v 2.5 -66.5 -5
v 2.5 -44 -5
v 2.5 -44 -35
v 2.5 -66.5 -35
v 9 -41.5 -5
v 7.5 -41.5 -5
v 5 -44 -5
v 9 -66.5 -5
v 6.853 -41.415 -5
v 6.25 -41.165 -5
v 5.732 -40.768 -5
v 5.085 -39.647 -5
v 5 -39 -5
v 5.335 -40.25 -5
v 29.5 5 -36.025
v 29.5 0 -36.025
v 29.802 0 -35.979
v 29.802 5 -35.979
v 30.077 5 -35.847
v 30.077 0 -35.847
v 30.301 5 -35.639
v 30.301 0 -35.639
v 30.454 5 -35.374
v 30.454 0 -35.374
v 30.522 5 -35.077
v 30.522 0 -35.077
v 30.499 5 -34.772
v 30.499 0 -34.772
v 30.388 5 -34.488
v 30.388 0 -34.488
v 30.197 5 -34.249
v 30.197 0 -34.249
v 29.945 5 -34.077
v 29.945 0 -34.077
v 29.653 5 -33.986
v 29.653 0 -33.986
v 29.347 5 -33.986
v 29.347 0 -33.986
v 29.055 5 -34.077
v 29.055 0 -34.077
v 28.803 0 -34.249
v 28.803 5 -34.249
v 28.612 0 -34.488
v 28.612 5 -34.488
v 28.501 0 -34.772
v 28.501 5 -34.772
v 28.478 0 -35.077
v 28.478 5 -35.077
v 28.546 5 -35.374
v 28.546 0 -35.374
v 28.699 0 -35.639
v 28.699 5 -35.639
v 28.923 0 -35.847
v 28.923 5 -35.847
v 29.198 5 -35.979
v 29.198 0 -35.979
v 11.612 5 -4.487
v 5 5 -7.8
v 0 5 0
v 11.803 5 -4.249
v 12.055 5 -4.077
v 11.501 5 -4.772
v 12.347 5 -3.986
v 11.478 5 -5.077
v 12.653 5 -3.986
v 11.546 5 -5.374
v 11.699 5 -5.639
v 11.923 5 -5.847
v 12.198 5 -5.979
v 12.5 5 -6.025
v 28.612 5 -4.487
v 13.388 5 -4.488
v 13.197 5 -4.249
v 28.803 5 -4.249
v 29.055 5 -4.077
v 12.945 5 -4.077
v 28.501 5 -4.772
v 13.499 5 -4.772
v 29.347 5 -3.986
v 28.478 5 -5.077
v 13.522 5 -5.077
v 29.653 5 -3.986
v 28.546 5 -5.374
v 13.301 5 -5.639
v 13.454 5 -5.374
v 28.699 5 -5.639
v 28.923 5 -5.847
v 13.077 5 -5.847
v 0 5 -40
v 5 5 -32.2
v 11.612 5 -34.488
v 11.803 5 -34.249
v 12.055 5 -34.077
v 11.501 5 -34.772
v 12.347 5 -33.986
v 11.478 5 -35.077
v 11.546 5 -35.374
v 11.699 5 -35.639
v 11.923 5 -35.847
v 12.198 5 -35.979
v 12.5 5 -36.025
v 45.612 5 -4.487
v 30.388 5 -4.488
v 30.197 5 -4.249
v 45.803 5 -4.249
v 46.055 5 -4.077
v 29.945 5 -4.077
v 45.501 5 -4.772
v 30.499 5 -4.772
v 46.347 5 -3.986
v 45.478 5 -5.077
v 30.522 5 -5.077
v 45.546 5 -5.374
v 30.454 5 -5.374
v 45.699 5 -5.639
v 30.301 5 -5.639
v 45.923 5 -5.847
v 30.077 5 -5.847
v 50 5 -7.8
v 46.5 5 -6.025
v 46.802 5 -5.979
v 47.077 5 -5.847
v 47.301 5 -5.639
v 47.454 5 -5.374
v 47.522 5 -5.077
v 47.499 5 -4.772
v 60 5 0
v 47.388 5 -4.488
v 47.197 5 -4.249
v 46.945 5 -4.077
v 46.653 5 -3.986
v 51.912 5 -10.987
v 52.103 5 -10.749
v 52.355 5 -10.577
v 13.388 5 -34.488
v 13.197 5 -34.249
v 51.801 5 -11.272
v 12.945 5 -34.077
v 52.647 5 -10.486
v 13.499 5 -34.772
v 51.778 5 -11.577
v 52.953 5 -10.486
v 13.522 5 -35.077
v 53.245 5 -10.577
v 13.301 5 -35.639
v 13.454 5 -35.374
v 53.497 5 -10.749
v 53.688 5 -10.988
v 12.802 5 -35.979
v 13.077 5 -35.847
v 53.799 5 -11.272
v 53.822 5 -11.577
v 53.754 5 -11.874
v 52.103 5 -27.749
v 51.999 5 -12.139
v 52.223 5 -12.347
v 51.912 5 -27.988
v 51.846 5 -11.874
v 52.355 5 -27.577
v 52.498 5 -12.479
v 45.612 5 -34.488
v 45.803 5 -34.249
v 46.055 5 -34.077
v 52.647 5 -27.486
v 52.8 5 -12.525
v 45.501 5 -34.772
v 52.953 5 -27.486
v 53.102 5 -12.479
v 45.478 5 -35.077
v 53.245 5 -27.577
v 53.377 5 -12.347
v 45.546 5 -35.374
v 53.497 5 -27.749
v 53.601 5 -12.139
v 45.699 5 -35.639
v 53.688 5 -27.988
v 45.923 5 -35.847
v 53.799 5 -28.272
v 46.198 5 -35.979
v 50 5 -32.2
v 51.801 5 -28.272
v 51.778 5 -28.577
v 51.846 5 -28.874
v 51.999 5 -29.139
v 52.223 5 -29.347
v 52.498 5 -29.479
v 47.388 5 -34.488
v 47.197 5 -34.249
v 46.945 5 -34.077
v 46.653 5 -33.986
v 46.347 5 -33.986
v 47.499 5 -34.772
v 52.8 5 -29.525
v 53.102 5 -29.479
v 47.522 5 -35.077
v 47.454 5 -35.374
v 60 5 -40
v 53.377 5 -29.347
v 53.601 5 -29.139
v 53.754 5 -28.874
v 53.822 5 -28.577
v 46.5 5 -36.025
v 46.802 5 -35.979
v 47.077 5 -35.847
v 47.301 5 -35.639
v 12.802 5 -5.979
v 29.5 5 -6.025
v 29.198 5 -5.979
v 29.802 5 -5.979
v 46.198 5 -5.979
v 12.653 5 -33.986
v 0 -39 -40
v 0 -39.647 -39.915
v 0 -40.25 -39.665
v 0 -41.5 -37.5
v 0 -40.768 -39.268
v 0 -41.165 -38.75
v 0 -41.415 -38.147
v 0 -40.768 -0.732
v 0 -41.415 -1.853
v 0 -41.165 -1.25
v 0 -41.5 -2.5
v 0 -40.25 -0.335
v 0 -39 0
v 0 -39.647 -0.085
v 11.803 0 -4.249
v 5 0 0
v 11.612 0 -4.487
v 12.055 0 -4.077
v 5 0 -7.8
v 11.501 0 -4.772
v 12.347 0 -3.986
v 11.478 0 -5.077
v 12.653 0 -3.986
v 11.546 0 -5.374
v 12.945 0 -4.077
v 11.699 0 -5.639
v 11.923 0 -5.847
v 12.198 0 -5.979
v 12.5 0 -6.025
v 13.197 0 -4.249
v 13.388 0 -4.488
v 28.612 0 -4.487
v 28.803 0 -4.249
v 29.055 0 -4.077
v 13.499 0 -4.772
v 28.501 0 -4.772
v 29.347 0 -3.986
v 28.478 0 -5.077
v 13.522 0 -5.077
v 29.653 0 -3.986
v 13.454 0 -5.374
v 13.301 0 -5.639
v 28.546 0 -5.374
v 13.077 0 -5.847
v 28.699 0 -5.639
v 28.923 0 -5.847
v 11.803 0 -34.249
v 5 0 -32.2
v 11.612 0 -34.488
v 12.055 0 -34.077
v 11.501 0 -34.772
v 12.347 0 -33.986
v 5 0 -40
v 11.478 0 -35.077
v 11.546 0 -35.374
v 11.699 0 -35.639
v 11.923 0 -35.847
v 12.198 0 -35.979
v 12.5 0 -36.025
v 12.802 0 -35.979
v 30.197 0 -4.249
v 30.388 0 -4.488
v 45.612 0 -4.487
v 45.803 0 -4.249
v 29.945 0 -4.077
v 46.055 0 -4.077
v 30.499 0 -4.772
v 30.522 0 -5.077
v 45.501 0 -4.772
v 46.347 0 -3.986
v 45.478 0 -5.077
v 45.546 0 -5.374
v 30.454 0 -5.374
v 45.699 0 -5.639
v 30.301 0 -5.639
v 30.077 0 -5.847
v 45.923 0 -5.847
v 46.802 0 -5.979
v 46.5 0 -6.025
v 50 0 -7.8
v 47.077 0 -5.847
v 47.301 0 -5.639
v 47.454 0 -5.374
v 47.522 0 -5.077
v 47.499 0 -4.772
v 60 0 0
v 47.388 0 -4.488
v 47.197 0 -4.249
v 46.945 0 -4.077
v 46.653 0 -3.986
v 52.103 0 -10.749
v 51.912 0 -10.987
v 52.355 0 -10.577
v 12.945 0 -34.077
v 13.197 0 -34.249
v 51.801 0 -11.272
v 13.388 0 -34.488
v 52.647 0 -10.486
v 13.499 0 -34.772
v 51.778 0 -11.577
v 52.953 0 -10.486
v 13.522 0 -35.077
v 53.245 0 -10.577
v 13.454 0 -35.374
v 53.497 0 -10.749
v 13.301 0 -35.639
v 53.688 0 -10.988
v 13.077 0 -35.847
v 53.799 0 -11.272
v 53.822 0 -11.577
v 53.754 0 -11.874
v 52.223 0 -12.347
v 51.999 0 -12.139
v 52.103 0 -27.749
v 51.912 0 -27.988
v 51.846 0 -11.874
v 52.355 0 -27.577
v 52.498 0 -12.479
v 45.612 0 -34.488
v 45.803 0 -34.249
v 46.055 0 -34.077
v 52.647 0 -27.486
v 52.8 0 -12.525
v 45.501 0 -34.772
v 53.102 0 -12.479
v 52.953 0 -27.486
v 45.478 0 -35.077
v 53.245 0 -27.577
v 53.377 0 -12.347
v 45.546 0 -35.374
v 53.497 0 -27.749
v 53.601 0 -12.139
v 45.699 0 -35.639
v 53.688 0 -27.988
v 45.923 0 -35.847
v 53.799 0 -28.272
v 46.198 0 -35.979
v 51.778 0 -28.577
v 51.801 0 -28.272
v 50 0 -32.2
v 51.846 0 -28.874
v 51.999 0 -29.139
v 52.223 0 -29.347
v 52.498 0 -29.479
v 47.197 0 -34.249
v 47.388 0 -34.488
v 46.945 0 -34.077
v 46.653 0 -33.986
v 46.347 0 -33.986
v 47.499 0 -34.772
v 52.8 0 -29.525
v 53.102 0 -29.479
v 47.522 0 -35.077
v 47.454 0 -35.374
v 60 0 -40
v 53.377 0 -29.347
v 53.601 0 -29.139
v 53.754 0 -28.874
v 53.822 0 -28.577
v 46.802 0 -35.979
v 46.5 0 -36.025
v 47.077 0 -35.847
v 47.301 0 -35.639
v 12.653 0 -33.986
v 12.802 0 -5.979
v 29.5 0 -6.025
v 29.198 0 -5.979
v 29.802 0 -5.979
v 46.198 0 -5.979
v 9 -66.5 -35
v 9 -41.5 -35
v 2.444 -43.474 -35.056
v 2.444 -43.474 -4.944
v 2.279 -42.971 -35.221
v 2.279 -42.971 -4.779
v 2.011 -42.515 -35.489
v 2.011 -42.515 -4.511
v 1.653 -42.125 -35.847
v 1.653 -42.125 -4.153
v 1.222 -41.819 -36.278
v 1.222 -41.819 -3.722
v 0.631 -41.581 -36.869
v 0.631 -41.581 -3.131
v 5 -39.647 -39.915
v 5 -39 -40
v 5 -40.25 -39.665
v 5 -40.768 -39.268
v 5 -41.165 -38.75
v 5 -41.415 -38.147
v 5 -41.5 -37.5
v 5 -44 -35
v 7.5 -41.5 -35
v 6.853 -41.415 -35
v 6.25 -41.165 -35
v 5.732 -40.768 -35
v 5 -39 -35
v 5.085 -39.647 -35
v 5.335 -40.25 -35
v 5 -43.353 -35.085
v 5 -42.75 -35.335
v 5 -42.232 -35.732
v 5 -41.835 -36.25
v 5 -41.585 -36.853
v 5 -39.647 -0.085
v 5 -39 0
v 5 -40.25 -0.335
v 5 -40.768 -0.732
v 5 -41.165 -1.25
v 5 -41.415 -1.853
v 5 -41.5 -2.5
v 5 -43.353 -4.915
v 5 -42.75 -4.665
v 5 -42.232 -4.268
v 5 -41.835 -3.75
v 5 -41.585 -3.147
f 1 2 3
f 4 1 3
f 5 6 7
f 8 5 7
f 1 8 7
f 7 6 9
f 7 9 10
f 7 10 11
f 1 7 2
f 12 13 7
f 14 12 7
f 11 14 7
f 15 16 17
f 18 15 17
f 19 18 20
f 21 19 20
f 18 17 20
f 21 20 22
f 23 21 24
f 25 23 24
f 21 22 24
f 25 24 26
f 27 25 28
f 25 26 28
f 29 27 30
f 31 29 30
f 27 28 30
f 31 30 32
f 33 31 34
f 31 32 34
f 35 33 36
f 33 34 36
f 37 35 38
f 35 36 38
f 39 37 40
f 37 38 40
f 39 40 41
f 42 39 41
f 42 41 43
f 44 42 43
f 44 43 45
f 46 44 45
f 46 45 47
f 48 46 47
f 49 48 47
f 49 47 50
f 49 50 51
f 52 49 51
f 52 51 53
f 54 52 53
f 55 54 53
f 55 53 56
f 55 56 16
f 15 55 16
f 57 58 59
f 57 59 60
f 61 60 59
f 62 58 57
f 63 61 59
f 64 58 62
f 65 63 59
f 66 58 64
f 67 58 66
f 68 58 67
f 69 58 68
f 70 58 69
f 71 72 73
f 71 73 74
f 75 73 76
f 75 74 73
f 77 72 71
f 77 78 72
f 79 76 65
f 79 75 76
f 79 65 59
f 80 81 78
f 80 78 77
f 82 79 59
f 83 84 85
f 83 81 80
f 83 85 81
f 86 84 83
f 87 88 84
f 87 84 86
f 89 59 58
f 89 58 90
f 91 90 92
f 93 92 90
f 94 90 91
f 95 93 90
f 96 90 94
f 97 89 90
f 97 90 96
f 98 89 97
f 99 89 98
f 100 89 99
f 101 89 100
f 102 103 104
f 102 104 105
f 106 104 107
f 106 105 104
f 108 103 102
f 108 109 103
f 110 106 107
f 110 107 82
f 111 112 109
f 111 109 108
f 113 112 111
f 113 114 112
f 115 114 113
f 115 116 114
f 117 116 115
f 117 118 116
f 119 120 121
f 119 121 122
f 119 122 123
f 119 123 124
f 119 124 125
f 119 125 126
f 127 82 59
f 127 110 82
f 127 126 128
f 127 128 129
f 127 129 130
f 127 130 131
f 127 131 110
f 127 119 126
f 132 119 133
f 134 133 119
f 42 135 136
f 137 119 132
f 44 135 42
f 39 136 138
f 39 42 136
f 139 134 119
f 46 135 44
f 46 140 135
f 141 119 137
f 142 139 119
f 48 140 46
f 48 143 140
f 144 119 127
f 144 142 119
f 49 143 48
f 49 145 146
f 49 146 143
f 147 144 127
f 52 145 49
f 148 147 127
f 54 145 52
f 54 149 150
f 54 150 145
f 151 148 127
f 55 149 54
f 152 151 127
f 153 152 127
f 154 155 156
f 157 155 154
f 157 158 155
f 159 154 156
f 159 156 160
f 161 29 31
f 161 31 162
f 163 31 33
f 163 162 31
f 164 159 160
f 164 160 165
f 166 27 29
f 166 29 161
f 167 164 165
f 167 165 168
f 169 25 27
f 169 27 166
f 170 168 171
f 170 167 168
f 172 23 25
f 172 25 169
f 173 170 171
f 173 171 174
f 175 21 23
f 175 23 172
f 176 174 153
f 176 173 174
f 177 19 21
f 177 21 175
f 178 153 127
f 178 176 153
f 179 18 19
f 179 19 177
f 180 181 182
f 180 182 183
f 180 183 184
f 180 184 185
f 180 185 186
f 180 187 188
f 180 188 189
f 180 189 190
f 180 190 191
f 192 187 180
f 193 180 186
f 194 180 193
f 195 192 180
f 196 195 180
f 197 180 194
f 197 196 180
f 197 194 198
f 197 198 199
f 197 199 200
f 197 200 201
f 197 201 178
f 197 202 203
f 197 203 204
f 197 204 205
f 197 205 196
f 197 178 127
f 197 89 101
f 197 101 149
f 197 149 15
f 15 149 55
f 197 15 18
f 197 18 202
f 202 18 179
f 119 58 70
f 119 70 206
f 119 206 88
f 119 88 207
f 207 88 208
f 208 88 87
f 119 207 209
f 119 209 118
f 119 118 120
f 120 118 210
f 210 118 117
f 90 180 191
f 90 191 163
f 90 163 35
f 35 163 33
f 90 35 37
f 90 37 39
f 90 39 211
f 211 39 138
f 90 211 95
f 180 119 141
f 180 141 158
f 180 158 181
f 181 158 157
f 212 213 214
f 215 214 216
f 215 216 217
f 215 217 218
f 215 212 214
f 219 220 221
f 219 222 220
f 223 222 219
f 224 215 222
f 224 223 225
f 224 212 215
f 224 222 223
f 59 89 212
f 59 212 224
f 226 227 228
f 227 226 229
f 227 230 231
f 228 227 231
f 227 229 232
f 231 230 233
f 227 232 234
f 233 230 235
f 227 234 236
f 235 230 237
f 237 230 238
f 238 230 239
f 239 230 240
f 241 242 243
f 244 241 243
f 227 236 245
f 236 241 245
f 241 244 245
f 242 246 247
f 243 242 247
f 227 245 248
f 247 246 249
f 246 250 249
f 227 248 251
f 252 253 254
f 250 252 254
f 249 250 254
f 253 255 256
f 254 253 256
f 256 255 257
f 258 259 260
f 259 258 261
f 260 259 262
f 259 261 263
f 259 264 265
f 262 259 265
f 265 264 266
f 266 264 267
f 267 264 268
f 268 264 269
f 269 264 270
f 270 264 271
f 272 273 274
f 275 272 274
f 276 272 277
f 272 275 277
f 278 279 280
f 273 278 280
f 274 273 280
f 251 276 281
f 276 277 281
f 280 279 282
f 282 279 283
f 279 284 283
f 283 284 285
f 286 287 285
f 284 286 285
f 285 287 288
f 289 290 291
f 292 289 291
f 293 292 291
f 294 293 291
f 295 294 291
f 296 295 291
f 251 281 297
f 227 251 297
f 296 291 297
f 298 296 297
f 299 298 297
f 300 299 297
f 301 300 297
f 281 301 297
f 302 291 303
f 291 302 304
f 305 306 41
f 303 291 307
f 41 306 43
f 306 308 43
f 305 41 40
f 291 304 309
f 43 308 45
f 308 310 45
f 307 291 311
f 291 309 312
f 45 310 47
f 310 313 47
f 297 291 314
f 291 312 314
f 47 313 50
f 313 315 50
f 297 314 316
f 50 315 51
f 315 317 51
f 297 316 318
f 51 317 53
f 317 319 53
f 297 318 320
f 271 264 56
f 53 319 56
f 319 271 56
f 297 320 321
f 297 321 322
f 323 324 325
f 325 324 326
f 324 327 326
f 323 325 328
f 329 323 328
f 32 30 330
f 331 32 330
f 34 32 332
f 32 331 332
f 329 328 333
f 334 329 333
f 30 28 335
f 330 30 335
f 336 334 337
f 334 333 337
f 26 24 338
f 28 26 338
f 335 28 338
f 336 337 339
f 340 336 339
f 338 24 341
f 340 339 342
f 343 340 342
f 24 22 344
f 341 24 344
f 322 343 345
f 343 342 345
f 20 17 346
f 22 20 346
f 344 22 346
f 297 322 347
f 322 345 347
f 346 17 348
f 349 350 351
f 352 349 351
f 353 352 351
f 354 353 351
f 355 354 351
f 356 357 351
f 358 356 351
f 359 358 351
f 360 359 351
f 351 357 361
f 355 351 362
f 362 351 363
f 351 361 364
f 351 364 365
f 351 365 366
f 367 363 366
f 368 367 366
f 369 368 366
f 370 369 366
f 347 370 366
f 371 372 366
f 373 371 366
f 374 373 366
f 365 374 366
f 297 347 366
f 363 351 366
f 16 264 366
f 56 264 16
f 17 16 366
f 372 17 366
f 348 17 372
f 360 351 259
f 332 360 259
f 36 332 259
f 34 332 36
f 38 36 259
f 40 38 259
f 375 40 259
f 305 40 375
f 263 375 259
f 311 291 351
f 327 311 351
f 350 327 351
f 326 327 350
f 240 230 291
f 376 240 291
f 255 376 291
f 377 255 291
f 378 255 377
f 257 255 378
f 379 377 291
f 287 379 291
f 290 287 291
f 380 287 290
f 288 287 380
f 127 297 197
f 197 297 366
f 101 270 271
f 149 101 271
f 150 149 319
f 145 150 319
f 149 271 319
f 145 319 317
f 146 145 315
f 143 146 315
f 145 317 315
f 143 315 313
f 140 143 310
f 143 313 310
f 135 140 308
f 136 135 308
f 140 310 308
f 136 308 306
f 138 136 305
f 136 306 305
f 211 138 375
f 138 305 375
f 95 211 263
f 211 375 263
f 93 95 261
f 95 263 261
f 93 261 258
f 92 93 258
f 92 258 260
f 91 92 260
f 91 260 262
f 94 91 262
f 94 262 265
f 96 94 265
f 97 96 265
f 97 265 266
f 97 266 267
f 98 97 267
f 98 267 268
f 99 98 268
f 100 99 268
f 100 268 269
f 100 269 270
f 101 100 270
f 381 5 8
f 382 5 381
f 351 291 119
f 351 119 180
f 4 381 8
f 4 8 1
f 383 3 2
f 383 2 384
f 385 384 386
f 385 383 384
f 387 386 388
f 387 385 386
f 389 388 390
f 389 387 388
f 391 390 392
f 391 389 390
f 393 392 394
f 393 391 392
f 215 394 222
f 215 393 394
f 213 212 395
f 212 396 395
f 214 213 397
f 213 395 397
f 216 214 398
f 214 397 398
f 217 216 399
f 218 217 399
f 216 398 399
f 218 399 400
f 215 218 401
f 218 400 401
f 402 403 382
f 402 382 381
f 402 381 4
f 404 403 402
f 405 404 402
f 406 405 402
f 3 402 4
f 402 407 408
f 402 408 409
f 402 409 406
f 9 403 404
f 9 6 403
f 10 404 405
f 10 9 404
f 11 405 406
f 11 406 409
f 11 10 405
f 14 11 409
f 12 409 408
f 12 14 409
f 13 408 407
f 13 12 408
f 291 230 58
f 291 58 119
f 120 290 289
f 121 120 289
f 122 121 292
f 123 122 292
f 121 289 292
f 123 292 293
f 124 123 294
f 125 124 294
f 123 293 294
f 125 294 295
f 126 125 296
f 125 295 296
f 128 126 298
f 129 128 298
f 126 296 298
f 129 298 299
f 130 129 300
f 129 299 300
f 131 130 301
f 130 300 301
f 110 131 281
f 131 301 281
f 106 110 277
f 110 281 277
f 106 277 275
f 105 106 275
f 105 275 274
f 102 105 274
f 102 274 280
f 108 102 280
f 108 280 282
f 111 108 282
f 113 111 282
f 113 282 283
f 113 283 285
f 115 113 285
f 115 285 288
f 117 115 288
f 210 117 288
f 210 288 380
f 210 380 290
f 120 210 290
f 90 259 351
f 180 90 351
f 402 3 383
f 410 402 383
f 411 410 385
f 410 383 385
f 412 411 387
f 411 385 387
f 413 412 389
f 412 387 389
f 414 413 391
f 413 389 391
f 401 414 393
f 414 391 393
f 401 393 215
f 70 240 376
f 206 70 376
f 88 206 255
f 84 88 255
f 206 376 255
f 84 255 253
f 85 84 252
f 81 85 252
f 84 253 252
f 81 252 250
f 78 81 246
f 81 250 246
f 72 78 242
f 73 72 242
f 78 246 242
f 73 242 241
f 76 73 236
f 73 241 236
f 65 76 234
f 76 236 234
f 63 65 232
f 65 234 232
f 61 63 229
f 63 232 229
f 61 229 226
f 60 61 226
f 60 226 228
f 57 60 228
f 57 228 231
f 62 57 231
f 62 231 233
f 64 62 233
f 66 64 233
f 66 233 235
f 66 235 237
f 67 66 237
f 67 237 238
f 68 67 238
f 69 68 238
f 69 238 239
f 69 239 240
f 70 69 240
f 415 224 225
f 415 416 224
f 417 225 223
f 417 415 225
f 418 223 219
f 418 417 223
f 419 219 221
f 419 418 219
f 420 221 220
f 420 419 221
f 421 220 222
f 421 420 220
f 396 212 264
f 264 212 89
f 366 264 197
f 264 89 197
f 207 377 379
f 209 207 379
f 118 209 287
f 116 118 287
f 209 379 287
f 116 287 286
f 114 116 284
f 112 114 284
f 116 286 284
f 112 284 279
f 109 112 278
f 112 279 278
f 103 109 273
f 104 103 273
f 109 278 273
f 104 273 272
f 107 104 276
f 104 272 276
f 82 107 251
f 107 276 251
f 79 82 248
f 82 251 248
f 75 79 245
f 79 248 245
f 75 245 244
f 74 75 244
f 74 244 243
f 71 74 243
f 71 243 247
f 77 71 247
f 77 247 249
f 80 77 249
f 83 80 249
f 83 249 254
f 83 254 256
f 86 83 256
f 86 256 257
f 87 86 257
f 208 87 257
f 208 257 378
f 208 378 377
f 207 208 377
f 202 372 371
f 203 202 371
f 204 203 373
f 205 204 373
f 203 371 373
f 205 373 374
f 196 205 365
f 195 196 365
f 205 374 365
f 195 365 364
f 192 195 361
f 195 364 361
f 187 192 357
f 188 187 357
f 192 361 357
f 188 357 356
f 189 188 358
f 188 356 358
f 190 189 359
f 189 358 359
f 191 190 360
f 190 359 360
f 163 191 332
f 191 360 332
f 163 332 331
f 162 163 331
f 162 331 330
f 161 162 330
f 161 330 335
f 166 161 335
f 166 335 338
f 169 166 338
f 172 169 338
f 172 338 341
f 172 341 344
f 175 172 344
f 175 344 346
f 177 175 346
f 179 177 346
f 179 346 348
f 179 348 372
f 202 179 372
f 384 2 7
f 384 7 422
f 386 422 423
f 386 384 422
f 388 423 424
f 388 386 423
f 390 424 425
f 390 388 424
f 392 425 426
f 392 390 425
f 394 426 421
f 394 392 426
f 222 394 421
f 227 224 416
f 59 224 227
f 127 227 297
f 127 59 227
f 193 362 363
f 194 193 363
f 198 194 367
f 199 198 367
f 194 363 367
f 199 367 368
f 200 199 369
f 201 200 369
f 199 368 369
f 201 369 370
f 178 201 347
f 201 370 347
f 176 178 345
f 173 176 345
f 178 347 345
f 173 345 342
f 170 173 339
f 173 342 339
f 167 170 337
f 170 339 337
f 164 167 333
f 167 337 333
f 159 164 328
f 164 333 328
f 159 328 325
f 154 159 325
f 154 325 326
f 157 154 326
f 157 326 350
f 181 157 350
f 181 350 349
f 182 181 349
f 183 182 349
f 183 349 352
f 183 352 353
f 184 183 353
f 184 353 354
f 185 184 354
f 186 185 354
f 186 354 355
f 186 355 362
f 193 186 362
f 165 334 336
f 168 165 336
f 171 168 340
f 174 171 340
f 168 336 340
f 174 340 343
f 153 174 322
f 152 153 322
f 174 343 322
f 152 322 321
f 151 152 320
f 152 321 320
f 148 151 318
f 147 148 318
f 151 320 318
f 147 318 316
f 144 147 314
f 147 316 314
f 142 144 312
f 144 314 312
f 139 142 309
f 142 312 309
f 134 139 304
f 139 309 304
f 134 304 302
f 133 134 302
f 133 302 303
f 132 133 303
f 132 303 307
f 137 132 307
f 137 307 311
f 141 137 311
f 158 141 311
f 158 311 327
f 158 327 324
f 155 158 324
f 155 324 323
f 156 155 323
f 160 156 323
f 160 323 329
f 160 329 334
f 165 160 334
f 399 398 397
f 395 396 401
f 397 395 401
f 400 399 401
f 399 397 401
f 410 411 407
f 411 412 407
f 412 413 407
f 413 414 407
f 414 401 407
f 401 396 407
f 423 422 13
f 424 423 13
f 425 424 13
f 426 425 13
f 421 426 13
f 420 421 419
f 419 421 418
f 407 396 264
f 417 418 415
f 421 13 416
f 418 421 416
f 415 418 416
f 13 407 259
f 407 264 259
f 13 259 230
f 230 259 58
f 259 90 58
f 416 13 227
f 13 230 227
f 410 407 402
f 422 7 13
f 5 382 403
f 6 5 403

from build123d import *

# Parameters (mm, degrees)
SKETCH1_W           = 60
SKETCH1_H           = 40
SKETCH1_W_2         = 45
SKETCH1_H_2         = 24.4
BOSS_EXTRUDE1_DEPTH = 5
SKETCH6_W           = 5
SKETCH6_H           = 40
BOSS_EXTRUDE4_DEPTH = 41.5
SKETCH7_W           = 6.5
SKETCH7_H           = 30
BOSS_EXTRUDE5_DEPTH = 25
FILLET2_R           = 2.5
FILLET3_R           = 2.5
CUT_EXTRUDE1_REACH  = 100.093
SKETCH8_R           = 1.025


with BuildPart() as part:
    # Sketch1 → Boss-Extrude1 (new body)
    with BuildSketch(Plane(origin=(0, 0, 0), x_dir=(1, 0, 0), z_dir=(0, 1, 0))):
        with Locations((30, 20)):
            Rectangle(SKETCH1_W, SKETCH1_H)
        with Locations((27.5, 20)):
            Rectangle(SKETCH1_W_2, SKETCH1_H_2, mode=Mode.SUBTRACT)
    extrude(amount=BOSS_EXTRUDE1_DEPTH)

    # Sketch6 → Boss-Extrude4 (add)
    with BuildSketch(Plane.XZ):
        with Locations((2.5, -20)):
            Rectangle(SKETCH6_W, SKETCH6_H)
    extrude(amount=BOSS_EXTRUDE4_DEPTH)

    # Sketch7 → Boss-Extrude5 (add)
    with BuildSketch(Plane(origin=(0, -41.5, 0), x_dir=(-1, 0, 0), z_dir=(0, -1, 0))):
        with Locations((-5.75, 20)):
            Rectangle(SKETCH7_W, SKETCH7_H)
    extrude(amount=BOSS_EXTRUDE5_DEPTH)

    # Fillet2
    fillet2_edges = [part.edges().sort_by_distance(p)[0] for p in [
        (5, -41.5, -20),
        (2.5, -41.5, -20),
    ]]
    fillet(fillet2_edges, radius=FILLET2_R - 0.0001)  # a hair under: the kernel refuses the full size

    # Fillet3
    fillet3_edges = [part.edges().sort_by_distance(p)[0] for p in [
        (2.50005, -41.5, -5),
        (2.50005, -41.5, -35),
        (2.5, -41.5, 0),
        (2.5, -41.5, -40),
    ]]
    fillet(fillet3_edges, radius=FILLET3_R - 0.0001)  # a hair under: the kernel refuses the full size

    # Sketch8 → Cut-Extrude1 (cut, up to next)
    with BuildSketch(Plane(origin=(0, 0, 0), x_dir=(-1, 0, 0), z_dir=(0, -1, 0)), mode=Mode.PRIVATE) as cut_extrude1_sk1:
        with Locations(Location((-52.8, 28.5, 0), (0, 0, 90))):
            Circle(SKETCH8_R)
    cut_extrude1_tool1 = extrude(cut_extrude1_sk1.sketch, amount=-CUT_EXTRUDE1_REACH, mode=Mode.PRIVATE) & part.part
    # Sketch8 → Cut-Extrude1 (cut, up to next)
    with BuildSketch(Plane(origin=(0, 0, 0), x_dir=(-1, 0, 0), z_dir=(0, -1, 0)), mode=Mode.PRIVATE) as cut_extrude1_sk2:
        with Locations(Location((-46.5, 35, 0), (0, 0, 90))):
            Circle(SKETCH8_R)
    cut_extrude1_tool2 = extrude(cut_extrude1_sk2.sketch, amount=-CUT_EXTRUDE1_REACH, mode=Mode.PRIVATE) & part.part
    # Sketch8 → Cut-Extrude1 (cut, up to next)
    with BuildSketch(Plane(origin=(0, 0, 0), x_dir=(-1, 0, 0), z_dir=(0, -1, 0)), mode=Mode.PRIVATE) as cut_extrude1_sk3:
        with Locations(Location((-29.5, 35, 0), (0, 0, 90))):
            Circle(SKETCH8_R)
    cut_extrude1_tool3 = extrude(cut_extrude1_sk3.sketch, amount=-CUT_EXTRUDE1_REACH, mode=Mode.PRIVATE) & part.part
    # Sketch8 → Cut-Extrude1 (cut, up to next)
    with BuildSketch(Plane(origin=(0, 0, 0), x_dir=(-1, 0, 0), z_dir=(0, -1, 0)), mode=Mode.PRIVATE) as cut_extrude1_sk4:
        with Locations(Location((-12.5, 35, 0), (0, 0, 90))):
            Circle(SKETCH8_R)
    cut_extrude1_tool4 = extrude(cut_extrude1_sk4.sketch, amount=-CUT_EXTRUDE1_REACH, mode=Mode.PRIVATE) & part.part
    # Sketch8 → Cut-Extrude1 (cut, up to next)
    with BuildSketch(Plane(origin=(0, 0, 0), x_dir=(-1, 0, 0), z_dir=(0, -1, 0)), mode=Mode.PRIVATE) as cut_extrude1_sk5:
        with Locations(Location((-12.5, 5, 0), (0, 0, 90))):
            Circle(SKETCH8_R)
    cut_extrude1_tool5 = extrude(cut_extrude1_sk5.sketch, amount=-CUT_EXTRUDE1_REACH, mode=Mode.PRIVATE) & part.part
    # Sketch8 → Cut-Extrude1 (cut, up to next)
    with BuildSketch(Plane(origin=(0, 0, 0), x_dir=(-1, 0, 0), z_dir=(0, -1, 0)), mode=Mode.PRIVATE) as cut_extrude1_sk6:
        with Locations(Location((-29.5, 5, 0), (0, 0, 90))):
            Circle(SKETCH8_R)
    cut_extrude1_tool6 = extrude(cut_extrude1_sk6.sketch, amount=-CUT_EXTRUDE1_REACH, mode=Mode.PRIVATE) & part.part
    # Sketch8 → Cut-Extrude1 (cut, up to next)
    with BuildSketch(Plane(origin=(0, 0, 0), x_dir=(-1, 0, 0), z_dir=(0, -1, 0)), mode=Mode.PRIVATE) as cut_extrude1_sk7:
        with Locations(Location((-46.5, 5, 0), (0, 0, 90))):
            Circle(SKETCH8_R)
    cut_extrude1_tool7 = extrude(cut_extrude1_sk7.sketch, amount=-CUT_EXTRUDE1_REACH, mode=Mode.PRIVATE) & part.part
    # Sketch8 → Cut-Extrude1 (cut, up to next)
    with BuildSketch(Plane(origin=(0, 0, 0), x_dir=(-1, 0, 0), z_dir=(0, -1, 0)), mode=Mode.PRIVATE) as cut_extrude1_sk8:
        with Locations(Location((-52.8, 11.5, 0), (0, 0, 90))):
            Circle(SKETCH8_R)
    cut_extrude1_tool8 = extrude(cut_extrude1_sk8.sketch, amount=-CUT_EXTRUDE1_REACH, mode=Mode.PRIVATE) & part.part
    add(cut_extrude1_tool1.solids().sort_by_distance((52.8, 0, -28.5))[0], mode=Mode.SUBTRACT)
    add(cut_extrude1_tool2.solids().sort_by_distance((46.5, 0, -35))[0], mode=Mode.SUBTRACT)
    add(cut_extrude1_tool3.solids().sort_by_distance((29.5, 0, -35))[0], mode=Mode.SUBTRACT)
    add(cut_extrude1_tool4.solids().sort_by_distance((12.5, 0, -35))[0], mode=Mode.SUBTRACT)
    add(cut_extrude1_tool5.solids().sort_by_distance((12.5, 0, -5))[0], mode=Mode.SUBTRACT)
    add(cut_extrude1_tool6.solids().sort_by_distance((29.5, 0, -5))[0], mode=Mode.SUBTRACT)
    add(cut_extrude1_tool7.solids().sort_by_distance((46.5, 0, -5))[0], mode=Mode.SUBTRACT)
    add(cut_extrude1_tool8.solids().sort_by_distance((52.8, 0, -11.5))[0], mode=Mode.SUBTRACT)


solid = part.part
